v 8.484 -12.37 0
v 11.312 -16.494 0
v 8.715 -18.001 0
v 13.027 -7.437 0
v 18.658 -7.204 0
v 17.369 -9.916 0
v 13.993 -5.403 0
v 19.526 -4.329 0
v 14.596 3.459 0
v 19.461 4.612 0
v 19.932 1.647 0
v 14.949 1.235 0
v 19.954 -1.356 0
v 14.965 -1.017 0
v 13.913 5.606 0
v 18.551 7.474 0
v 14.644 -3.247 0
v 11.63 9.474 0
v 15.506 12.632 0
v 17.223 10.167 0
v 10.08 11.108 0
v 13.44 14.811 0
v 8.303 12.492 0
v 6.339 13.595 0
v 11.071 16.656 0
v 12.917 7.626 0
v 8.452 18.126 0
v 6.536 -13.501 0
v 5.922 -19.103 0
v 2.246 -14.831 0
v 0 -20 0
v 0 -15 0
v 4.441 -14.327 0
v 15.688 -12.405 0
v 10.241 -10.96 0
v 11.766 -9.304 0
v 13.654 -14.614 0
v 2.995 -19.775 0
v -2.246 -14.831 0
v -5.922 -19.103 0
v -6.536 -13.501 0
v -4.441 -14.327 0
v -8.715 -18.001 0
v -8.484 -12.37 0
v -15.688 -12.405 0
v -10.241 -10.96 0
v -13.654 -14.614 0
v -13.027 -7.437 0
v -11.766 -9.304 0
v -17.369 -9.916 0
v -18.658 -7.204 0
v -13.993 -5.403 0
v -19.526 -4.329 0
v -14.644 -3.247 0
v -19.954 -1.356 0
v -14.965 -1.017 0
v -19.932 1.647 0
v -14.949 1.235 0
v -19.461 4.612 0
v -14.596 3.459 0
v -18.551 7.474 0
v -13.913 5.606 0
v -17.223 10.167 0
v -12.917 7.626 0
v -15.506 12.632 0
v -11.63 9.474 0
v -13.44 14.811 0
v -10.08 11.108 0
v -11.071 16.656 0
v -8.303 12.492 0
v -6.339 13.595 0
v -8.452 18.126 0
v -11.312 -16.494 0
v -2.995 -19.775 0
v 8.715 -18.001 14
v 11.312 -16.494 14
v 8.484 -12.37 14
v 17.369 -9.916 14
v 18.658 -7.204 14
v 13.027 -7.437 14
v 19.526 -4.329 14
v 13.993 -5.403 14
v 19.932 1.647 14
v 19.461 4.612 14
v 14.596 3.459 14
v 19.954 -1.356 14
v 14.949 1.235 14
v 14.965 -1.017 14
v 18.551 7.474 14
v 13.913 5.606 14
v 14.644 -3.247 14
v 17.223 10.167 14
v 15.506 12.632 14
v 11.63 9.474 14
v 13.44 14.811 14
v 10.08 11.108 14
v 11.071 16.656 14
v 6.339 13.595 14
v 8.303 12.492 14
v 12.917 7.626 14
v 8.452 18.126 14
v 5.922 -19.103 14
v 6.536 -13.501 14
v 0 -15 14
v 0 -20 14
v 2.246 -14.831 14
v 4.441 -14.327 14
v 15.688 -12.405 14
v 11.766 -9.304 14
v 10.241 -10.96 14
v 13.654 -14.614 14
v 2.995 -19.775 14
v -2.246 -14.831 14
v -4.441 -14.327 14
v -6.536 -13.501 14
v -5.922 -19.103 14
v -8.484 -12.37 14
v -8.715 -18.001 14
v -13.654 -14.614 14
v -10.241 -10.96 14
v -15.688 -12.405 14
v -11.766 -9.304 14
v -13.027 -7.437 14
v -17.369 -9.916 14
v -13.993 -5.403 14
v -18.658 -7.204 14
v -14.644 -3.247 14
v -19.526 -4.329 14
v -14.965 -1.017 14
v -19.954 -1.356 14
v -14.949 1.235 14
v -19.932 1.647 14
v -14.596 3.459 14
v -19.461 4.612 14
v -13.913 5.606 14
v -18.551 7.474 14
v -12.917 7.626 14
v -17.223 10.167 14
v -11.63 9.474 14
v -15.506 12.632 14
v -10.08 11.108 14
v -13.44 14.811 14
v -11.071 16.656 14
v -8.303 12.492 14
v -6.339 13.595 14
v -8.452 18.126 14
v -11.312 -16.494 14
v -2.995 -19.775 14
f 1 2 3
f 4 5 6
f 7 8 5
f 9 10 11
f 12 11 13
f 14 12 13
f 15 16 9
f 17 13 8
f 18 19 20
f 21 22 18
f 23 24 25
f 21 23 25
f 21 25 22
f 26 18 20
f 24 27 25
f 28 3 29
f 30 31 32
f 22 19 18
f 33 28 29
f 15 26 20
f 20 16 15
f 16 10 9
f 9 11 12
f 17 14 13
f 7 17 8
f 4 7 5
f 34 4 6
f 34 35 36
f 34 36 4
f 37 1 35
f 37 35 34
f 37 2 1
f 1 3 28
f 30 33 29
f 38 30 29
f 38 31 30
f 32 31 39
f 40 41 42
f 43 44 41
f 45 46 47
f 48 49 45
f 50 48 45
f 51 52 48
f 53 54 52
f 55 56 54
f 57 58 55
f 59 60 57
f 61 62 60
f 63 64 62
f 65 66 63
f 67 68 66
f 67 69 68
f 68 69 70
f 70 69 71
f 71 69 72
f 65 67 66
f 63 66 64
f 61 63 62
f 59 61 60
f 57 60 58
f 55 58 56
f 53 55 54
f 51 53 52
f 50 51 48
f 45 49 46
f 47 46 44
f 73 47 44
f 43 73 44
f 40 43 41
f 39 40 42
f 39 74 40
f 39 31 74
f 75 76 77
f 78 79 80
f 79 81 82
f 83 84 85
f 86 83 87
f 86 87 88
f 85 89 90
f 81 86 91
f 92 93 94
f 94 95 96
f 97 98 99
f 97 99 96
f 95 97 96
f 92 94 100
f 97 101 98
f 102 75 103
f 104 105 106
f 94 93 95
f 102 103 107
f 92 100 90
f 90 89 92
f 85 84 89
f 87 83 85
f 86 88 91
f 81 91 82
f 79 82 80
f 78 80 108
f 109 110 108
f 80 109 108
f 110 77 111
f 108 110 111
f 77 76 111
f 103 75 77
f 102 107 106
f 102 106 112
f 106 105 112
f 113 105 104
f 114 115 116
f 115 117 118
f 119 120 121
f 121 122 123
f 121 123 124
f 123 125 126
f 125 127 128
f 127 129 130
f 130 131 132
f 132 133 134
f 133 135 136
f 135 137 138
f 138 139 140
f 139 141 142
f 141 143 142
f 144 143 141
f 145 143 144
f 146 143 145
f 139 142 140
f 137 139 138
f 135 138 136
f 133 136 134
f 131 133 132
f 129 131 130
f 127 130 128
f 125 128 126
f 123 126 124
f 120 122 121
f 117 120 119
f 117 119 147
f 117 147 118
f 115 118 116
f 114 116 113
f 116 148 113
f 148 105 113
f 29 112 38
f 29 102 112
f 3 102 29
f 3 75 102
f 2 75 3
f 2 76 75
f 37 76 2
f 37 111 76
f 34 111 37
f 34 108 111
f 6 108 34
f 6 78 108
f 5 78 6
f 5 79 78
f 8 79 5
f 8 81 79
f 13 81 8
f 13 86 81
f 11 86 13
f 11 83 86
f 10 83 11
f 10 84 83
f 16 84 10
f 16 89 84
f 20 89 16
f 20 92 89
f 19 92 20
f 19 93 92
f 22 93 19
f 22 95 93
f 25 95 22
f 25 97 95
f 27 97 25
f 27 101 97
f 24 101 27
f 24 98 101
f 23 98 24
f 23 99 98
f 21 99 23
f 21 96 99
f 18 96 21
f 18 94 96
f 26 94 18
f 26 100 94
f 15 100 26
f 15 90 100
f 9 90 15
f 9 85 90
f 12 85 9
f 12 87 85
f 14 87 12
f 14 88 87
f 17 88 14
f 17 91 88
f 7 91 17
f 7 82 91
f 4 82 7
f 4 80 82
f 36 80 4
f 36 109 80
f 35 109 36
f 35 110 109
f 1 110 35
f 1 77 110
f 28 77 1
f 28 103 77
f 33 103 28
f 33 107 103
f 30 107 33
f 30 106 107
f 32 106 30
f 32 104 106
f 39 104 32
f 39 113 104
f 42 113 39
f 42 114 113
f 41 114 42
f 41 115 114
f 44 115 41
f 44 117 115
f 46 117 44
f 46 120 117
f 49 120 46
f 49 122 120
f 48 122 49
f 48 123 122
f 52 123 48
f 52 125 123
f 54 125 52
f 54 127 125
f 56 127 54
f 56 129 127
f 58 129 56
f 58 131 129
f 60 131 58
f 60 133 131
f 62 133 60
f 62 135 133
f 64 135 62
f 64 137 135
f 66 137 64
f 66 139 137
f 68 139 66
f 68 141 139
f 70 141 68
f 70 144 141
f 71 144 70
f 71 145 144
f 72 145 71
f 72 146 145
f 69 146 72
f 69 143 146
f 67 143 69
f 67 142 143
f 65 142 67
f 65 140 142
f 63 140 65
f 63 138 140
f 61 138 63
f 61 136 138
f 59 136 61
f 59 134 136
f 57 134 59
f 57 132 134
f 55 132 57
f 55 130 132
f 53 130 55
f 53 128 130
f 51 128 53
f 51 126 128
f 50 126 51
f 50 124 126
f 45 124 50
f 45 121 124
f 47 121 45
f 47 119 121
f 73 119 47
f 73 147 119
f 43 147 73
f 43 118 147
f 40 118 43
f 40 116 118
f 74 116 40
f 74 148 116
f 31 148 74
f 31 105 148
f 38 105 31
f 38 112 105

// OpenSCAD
$fn = 32;

// ----------------------------------------------------------------------
// Spring clip: 40 mm outside, 5 mm band, 50 degree opening
// ----------------------------------------------------------------------

// --- parameters (mm) ---
outer_r = 20;             // clip outside radius
inner_r = 15;             // clip bore radius
band = 5;                 // band thickness
clip_w = 14;              // clip width
opening = 50;             // opening angle

clip_profile = [[-8.452, 18.126], [-11.071, 16.656], [-13.44, 14.811], [-15.506, 12.632], [-17.223, 10.167], [-18.551, 7.474], [-19.461, 4.612], [-19.932, 1.647], [-19.954, -1.356], [-19.526, -4.329], [-18.658, -7.204], [-17.369, -9.916], [-15.688, -12.405], [-13.654, -14.614], [-11.312, -16.494], [-8.715, -18.001], [-5.922, -19.103], [-2.995, -19.775], [0, -20], [2.995, -19.775], [5.922, -19.103], [8.715, -18.001], [11.312, -16.494], [13.654, -14.614], [15.688, -12.405], [17.369, -9.916], [18.658, -7.204], [19.526, -4.329], [19.954, -1.356], [19.932, 1.647], [19.461, 4.612], [18.551, 7.474], [17.223, 10.167], [15.506, 12.632], [13.44, 14.811], [11.071, 16.656], [8.452, 18.126], [6.339, 13.595], [8.303, 12.492], [10.08, 11.108], [11.63, 9.474], [12.917, 7.626], [13.913, 5.606], [14.596, 3.459], [14.949, 1.235], [14.965, -1.017], [14.644, -3.247], [13.993, -5.403], [13.027, -7.437], [11.766, -9.304], [10.241, -10.96], [8.484, -12.37], [6.536, -13.501], [4.441, -14.327], [2.246, -14.831], [0, -15], [-2.246, -14.831], [-4.441, -14.327], [-6.536, -13.501], [-8.484, -12.37], [-10.241, -10.96], [-11.766, -9.304], [-13.027, -7.437], [-13.993, -5.403], [-14.644, -3.247], [-14.965, -1.017], [-14.949, 1.235], [-14.596, 3.459], [-13.913, 5.606], [-12.917, 7.626], [-11.63, 9.474], [-10.08, 11.108], [-8.303, 12.492], [-6.339, 13.595]];

difference() {
  union() {
    linear_extrude(height = clip_w) polygon(clip_profile);
  }
}
